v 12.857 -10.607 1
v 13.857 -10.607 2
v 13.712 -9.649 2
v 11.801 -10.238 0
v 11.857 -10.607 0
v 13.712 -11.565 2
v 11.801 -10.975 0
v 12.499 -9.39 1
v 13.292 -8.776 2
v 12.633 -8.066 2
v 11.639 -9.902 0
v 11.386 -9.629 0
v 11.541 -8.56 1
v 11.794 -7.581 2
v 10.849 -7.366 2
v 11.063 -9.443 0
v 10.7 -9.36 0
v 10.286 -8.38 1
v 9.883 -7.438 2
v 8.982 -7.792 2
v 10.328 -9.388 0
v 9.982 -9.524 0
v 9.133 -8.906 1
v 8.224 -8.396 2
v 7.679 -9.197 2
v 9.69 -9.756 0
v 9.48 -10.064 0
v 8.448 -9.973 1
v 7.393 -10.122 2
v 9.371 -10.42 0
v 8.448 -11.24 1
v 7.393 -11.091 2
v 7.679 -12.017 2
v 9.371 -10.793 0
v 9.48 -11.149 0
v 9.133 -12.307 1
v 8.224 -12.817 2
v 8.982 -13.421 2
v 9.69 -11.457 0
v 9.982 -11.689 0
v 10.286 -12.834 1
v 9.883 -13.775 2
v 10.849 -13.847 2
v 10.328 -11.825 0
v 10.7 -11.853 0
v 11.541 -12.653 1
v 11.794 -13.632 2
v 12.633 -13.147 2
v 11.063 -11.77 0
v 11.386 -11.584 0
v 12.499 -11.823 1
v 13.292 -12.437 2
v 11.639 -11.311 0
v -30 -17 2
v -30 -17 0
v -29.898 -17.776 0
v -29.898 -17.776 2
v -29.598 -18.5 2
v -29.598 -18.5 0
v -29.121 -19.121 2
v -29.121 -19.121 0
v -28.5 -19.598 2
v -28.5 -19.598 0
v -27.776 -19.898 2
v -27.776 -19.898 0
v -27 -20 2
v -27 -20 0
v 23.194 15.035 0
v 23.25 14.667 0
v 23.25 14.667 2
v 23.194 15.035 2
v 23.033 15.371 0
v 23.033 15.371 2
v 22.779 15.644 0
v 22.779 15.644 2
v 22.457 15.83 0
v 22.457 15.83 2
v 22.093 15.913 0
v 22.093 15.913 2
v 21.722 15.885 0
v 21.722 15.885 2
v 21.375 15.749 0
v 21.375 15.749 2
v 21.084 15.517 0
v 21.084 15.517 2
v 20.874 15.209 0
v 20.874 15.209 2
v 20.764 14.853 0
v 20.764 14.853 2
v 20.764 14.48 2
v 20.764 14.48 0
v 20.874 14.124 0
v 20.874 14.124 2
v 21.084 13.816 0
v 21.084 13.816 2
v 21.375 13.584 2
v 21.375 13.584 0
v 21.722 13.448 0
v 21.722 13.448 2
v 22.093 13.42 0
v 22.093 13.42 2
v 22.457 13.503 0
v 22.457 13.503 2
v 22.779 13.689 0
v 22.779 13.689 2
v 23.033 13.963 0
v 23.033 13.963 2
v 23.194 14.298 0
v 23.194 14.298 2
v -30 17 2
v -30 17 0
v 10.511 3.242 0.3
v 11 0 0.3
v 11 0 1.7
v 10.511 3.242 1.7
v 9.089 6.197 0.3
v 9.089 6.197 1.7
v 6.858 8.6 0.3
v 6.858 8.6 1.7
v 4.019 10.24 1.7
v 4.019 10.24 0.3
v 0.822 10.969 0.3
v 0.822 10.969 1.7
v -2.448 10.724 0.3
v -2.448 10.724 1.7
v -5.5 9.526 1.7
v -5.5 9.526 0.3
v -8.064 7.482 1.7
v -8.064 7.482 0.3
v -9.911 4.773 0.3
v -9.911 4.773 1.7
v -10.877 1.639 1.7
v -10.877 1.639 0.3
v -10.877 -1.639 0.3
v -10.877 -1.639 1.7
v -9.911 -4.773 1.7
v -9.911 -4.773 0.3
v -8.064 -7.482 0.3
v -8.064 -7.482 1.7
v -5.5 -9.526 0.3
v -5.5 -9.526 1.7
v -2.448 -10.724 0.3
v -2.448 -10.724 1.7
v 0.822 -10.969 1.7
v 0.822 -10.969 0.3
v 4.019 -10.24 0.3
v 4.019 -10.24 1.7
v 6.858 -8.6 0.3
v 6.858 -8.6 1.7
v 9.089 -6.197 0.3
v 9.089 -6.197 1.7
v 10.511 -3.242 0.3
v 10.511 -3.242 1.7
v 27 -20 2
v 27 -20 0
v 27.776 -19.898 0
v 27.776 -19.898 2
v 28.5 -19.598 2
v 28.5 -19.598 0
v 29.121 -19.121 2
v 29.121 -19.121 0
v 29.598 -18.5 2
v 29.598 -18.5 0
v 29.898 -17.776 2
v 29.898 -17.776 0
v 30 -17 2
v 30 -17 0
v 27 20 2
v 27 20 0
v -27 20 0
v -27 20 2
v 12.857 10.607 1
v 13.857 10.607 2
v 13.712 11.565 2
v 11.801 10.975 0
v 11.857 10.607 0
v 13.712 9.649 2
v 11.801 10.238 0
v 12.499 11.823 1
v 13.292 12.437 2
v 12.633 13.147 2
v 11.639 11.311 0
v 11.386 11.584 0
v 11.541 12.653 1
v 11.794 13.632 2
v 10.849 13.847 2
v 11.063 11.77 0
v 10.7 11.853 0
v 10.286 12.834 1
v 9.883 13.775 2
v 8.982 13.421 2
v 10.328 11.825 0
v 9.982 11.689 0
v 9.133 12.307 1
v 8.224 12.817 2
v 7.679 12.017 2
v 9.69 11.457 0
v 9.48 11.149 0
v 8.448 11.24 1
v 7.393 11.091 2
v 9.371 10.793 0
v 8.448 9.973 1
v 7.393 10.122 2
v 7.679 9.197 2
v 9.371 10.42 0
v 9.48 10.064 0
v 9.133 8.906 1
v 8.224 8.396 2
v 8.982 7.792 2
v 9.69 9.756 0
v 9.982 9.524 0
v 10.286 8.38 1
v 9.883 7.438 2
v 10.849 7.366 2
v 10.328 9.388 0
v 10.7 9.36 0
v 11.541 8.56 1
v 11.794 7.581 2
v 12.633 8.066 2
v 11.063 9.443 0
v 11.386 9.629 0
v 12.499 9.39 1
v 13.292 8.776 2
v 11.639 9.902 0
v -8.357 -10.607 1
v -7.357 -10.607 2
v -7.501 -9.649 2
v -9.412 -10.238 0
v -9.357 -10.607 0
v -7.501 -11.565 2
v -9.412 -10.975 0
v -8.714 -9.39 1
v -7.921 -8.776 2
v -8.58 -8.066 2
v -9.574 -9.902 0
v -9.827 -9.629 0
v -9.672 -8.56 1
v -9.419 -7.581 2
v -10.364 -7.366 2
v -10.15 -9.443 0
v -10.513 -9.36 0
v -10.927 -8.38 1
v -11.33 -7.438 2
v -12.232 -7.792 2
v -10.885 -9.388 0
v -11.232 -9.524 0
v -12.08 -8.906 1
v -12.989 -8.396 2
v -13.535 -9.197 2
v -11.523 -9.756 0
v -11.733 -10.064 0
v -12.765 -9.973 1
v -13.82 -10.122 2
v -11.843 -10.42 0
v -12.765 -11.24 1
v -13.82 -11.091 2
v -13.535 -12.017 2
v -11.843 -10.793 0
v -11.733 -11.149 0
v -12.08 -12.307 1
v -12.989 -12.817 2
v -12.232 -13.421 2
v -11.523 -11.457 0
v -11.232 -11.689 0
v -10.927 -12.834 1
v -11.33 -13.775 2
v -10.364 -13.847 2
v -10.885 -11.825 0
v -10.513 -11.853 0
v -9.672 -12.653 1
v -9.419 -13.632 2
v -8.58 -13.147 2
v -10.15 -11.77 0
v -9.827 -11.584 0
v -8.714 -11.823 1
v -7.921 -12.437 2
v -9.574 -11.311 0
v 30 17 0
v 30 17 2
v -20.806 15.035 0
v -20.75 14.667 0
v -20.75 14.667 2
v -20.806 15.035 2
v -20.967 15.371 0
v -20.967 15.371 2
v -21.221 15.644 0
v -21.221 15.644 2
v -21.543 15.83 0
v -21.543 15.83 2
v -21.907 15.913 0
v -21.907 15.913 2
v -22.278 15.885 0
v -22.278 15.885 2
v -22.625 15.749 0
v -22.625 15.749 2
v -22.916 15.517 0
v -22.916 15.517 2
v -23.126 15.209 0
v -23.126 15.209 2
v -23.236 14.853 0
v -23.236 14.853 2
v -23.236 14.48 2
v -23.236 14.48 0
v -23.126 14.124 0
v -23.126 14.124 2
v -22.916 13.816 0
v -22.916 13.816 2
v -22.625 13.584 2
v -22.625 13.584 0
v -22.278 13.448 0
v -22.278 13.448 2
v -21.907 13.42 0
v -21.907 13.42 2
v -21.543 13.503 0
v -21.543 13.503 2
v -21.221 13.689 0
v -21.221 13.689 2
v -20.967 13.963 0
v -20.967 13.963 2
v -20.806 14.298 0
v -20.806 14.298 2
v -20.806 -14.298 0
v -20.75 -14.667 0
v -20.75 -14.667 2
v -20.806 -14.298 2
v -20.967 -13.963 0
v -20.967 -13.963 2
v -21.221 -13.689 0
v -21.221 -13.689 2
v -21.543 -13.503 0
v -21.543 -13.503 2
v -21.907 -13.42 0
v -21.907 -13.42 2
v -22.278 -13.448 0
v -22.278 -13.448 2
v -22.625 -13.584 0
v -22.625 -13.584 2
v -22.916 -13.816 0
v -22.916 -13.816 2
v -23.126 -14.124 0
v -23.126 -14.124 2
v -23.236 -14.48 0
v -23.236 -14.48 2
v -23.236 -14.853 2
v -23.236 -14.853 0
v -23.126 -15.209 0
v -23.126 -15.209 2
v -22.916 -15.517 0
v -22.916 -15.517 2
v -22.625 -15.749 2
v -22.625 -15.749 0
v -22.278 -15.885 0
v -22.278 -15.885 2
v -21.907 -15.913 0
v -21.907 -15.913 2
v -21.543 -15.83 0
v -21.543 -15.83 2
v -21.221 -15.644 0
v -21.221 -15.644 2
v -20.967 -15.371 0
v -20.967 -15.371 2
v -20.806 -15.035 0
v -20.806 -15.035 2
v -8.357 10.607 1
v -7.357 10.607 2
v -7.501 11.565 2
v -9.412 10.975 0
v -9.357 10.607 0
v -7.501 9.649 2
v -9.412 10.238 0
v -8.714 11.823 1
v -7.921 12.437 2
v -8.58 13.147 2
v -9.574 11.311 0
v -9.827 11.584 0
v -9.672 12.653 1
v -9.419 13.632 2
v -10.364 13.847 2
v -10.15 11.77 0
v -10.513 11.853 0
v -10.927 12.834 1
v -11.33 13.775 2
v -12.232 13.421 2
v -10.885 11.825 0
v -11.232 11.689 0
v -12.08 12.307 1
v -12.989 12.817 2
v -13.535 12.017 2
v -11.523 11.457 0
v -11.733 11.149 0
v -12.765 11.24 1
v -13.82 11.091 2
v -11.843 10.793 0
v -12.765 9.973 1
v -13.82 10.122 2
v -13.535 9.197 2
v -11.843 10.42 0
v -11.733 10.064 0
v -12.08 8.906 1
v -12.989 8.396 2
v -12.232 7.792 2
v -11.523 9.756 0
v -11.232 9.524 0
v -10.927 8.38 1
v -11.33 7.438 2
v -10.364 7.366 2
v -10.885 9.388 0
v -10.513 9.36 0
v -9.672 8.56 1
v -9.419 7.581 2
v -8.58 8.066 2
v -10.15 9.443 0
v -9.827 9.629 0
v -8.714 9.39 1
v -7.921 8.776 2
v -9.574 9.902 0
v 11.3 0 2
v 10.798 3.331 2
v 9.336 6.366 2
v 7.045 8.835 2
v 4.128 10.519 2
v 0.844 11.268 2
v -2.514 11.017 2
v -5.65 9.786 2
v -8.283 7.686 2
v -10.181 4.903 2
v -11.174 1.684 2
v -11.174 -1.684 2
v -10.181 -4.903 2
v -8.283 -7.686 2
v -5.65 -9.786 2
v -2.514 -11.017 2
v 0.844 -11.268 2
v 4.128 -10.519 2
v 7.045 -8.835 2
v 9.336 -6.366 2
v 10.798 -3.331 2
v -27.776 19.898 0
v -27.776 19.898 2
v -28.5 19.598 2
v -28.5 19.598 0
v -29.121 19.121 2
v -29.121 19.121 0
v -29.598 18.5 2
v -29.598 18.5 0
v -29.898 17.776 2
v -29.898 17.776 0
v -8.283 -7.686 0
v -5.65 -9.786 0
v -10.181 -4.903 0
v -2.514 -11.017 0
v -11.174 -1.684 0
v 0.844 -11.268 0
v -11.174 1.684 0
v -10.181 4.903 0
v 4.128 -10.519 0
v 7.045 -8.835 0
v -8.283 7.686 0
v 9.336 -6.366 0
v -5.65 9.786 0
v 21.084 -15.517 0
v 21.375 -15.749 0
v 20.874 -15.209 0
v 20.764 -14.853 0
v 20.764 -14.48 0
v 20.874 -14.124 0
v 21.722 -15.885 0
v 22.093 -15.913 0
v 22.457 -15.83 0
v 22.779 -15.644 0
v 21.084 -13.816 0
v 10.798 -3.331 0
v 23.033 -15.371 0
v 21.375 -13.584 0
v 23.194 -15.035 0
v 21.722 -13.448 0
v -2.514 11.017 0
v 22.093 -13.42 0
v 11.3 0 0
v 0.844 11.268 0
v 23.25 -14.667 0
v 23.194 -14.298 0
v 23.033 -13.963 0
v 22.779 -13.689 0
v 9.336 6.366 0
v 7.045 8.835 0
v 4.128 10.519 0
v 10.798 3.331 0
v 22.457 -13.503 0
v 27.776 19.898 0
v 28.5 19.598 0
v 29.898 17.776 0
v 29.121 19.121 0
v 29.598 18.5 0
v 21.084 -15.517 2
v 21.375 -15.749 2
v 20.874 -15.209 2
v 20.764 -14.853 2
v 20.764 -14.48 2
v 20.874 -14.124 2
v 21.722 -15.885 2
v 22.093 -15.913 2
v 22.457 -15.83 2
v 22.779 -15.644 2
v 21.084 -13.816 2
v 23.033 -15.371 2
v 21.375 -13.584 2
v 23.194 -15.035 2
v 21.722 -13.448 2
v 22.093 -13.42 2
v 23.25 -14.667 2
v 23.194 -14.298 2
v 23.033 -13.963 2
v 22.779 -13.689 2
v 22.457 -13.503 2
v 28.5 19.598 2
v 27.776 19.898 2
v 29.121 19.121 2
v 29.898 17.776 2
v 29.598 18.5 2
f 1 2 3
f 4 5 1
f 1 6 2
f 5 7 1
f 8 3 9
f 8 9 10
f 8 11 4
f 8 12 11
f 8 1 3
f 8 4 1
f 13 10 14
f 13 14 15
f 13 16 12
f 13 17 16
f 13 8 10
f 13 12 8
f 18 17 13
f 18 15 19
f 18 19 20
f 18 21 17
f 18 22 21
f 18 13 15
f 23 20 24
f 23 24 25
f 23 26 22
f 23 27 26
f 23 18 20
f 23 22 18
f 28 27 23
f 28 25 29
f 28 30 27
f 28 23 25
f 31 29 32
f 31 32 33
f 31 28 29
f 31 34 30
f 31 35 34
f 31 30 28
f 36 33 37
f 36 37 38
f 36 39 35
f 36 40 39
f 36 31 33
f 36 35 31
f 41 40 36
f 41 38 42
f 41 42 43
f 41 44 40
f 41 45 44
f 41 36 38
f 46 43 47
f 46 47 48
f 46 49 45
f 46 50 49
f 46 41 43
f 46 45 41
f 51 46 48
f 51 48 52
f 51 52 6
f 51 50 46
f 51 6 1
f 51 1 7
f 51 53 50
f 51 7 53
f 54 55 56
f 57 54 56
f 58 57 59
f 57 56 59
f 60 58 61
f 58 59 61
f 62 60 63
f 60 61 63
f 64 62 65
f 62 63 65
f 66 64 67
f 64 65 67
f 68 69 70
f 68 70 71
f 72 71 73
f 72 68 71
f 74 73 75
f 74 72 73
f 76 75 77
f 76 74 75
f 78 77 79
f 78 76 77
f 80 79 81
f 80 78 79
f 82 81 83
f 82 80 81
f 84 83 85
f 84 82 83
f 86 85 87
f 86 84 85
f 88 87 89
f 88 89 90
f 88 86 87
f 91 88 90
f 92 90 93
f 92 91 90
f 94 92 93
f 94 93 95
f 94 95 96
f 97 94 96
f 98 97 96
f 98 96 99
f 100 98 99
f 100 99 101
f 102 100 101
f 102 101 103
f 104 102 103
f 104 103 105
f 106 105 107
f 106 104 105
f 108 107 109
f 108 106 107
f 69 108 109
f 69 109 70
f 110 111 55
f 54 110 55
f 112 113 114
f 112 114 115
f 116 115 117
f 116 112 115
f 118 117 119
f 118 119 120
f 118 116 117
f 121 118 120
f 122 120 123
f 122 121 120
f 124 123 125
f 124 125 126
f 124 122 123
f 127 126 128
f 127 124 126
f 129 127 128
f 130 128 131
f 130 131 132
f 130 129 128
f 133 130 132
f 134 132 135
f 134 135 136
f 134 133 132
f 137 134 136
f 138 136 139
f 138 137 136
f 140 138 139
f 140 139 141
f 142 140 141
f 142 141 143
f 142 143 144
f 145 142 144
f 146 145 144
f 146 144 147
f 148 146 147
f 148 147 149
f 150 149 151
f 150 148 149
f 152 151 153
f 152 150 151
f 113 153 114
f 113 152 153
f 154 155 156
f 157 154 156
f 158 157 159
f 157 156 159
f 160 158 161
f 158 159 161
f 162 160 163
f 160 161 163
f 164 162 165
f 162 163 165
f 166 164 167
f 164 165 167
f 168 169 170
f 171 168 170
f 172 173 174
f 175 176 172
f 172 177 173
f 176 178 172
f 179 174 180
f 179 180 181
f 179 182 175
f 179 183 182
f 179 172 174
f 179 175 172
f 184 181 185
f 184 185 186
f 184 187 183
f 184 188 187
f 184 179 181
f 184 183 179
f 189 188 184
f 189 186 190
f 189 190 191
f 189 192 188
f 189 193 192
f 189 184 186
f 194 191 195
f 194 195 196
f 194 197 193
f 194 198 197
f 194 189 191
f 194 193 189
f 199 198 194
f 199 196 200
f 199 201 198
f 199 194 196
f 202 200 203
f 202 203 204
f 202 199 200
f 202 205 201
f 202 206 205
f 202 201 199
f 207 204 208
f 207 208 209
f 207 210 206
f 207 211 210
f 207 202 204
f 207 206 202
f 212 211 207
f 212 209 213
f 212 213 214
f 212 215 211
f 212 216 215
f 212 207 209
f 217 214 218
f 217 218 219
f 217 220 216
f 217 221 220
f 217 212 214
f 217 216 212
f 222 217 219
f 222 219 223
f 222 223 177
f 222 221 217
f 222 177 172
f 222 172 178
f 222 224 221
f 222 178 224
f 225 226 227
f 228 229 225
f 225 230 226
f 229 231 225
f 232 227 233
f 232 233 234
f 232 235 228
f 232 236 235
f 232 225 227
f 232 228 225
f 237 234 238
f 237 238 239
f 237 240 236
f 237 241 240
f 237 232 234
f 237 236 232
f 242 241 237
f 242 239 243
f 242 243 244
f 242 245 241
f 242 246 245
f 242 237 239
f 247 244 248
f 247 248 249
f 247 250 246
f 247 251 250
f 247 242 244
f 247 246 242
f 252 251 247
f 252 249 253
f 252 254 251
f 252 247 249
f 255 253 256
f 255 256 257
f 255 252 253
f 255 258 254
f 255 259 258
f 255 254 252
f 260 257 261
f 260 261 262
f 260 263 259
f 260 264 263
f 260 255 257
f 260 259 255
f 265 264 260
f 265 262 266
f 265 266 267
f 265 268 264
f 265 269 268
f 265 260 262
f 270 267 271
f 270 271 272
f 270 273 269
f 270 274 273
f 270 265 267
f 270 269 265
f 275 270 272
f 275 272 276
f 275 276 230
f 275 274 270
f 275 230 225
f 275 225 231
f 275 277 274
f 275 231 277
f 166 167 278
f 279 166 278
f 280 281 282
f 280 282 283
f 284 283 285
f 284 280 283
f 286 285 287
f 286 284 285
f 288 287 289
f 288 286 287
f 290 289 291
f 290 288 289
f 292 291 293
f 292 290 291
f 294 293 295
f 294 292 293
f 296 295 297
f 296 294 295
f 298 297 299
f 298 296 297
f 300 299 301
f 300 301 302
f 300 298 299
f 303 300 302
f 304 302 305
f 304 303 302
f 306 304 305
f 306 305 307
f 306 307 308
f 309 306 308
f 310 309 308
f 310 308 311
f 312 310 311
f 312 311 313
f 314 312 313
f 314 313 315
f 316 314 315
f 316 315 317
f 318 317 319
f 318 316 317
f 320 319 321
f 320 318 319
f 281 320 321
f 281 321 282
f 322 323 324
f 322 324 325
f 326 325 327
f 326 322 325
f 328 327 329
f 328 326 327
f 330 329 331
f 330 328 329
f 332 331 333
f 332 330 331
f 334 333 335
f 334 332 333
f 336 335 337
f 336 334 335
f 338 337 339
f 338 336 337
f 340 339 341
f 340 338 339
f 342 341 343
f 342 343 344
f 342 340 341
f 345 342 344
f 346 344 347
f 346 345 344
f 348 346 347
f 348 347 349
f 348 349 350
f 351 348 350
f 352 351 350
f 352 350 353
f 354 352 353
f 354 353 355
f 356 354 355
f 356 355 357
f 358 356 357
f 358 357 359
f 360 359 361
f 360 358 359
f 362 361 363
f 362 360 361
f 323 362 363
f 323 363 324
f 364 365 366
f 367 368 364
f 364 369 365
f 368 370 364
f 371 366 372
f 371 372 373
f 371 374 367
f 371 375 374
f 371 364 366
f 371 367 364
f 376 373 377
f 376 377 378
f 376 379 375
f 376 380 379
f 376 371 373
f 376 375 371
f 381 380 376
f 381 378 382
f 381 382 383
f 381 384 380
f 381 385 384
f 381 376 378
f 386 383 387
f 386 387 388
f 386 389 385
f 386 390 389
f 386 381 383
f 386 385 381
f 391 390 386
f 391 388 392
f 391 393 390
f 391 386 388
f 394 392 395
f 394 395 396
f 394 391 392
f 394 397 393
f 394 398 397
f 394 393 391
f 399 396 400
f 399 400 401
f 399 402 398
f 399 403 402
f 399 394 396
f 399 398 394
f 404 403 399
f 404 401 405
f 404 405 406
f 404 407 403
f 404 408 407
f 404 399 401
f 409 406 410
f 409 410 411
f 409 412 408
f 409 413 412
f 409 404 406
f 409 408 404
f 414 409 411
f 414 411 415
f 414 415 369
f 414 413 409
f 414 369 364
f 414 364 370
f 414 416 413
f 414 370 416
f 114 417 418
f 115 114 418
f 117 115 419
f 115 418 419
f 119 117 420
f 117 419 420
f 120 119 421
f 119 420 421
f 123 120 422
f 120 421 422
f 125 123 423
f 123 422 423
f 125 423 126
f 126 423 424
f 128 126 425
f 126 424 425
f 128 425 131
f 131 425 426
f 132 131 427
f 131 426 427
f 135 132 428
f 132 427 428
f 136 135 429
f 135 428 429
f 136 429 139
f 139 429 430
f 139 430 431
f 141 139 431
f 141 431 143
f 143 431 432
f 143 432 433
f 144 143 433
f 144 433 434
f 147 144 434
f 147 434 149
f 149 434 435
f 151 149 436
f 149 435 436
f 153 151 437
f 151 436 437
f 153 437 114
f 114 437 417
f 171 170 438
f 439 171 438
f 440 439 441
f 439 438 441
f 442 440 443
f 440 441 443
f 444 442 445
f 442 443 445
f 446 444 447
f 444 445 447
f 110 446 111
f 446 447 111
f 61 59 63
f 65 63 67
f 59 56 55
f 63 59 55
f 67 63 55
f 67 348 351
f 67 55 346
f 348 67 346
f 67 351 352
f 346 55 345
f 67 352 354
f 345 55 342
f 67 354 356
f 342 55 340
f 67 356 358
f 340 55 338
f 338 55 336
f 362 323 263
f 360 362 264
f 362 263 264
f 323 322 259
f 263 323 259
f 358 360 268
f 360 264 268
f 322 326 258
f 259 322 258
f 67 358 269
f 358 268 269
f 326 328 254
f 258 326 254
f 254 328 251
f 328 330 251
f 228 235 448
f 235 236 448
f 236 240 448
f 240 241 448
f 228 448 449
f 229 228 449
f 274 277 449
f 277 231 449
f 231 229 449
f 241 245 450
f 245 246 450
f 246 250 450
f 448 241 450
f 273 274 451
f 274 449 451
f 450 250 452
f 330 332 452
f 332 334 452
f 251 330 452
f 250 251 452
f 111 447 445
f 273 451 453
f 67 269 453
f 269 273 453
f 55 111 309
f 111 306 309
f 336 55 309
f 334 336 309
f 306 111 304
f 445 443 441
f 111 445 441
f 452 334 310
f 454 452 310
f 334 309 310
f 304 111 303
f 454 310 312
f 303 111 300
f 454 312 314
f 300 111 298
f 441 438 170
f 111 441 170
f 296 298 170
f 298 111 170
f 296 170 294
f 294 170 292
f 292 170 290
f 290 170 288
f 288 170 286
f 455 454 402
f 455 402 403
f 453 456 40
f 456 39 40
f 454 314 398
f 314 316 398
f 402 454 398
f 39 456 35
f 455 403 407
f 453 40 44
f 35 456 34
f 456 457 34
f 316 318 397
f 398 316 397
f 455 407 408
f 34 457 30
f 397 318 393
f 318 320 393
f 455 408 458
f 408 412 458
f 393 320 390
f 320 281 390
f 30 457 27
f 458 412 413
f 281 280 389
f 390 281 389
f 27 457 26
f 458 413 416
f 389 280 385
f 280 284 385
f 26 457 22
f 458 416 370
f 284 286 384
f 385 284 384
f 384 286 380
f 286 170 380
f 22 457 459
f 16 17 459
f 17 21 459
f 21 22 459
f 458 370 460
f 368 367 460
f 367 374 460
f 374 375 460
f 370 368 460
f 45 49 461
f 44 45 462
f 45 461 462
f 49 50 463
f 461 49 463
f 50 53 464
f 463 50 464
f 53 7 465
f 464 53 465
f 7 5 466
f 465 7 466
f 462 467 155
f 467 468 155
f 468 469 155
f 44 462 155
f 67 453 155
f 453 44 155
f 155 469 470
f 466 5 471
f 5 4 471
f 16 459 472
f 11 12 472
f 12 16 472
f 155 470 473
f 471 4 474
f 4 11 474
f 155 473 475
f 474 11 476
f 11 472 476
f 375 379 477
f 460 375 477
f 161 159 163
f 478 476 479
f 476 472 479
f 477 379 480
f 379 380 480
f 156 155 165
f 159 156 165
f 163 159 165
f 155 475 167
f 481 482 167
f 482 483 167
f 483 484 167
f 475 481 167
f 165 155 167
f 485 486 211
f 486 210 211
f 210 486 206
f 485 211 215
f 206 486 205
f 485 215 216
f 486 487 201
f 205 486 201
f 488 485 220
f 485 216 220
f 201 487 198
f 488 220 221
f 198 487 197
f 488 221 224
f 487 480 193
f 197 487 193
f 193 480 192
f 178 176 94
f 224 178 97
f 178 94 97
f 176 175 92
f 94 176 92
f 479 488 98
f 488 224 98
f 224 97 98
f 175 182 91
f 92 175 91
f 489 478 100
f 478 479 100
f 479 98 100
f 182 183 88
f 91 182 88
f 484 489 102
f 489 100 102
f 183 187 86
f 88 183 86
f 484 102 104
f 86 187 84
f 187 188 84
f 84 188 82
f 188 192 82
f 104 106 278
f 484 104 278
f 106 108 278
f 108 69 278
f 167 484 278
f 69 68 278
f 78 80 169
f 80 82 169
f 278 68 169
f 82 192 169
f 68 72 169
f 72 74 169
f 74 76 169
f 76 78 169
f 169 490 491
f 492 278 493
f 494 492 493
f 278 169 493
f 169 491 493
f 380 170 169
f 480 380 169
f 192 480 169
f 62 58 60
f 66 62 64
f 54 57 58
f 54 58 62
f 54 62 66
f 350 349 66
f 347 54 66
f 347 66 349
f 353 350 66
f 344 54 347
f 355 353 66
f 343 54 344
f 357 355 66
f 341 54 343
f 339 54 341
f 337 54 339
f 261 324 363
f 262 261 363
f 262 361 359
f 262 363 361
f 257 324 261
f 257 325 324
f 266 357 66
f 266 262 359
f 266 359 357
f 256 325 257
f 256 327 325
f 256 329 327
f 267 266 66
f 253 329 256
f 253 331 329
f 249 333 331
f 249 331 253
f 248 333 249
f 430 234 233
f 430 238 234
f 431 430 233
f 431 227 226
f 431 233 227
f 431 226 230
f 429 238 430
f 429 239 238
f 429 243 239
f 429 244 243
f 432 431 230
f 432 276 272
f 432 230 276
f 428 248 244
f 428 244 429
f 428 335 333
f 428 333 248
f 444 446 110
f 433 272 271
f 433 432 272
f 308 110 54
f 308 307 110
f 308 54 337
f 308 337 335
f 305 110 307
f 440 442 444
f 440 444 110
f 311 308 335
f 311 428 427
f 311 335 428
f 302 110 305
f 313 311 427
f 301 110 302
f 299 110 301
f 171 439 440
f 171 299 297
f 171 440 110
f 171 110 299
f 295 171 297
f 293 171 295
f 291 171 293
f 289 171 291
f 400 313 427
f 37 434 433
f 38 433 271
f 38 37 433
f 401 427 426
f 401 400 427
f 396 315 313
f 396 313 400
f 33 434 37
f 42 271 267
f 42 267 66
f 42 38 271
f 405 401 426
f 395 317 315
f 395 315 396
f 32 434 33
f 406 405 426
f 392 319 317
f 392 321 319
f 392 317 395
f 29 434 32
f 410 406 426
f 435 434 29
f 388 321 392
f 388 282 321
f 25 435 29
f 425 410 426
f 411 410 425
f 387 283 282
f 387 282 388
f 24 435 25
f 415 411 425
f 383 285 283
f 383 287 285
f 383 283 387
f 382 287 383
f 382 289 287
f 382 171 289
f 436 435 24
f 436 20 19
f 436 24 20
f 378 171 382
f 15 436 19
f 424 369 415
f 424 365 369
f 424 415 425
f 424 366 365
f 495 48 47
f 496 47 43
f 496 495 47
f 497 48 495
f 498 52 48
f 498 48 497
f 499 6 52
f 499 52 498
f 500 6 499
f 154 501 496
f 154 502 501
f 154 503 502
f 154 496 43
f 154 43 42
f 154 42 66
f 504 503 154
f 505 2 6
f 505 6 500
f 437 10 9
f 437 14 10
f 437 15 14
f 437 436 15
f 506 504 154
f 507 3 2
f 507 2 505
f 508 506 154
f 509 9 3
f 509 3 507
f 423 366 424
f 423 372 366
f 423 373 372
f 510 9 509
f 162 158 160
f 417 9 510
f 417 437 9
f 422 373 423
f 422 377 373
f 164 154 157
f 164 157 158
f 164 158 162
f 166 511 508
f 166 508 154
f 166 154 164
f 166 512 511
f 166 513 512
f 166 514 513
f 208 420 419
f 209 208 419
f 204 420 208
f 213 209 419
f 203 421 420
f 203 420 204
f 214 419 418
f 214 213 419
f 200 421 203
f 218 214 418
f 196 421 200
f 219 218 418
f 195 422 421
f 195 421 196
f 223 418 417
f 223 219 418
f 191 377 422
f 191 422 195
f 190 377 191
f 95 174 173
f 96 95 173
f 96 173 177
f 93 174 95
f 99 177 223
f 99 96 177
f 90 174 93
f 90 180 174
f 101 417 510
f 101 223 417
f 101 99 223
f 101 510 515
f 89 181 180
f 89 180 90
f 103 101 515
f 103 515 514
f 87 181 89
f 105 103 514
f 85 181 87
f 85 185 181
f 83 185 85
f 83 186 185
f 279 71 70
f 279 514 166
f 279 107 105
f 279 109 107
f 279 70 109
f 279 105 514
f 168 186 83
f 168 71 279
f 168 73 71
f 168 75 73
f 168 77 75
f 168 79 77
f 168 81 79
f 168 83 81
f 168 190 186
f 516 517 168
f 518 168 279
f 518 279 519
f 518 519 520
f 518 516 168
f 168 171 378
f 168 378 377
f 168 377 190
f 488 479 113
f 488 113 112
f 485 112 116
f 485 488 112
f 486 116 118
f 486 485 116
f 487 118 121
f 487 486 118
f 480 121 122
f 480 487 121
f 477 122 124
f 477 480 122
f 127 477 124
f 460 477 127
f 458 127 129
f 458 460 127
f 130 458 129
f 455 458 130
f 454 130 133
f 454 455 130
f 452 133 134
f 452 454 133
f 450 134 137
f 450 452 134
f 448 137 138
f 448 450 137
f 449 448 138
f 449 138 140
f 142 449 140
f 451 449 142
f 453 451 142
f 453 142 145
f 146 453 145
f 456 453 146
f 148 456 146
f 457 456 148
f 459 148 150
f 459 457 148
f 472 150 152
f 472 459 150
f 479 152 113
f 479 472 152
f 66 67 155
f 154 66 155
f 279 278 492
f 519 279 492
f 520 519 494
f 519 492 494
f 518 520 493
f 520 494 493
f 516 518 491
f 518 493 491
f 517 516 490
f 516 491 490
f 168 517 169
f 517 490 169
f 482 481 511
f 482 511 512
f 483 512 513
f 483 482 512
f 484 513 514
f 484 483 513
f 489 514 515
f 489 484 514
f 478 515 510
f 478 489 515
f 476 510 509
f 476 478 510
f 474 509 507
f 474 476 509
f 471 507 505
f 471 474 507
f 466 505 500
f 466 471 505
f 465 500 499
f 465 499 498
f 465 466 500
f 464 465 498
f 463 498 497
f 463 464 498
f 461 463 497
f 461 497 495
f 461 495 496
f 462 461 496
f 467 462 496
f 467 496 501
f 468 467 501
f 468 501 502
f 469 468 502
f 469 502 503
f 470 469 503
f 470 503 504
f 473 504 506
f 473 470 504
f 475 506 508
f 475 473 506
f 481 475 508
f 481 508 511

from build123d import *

# Parameters (mm, degrees)
SZKIC1_R                    = 11
SZKIC1_R_2                  = 1.25
DODANIE_WYCI_GNI_CIE1_DEPTH = 2
SFAZOWANIE1_SIZE            = 0.3
SFAZOWANIE2_SIZE            = 2


with BuildPart() as part:
    # Szkic1 → Dodanie-wyciągnięcie1 (new body)
    with BuildSketch(Plane.XY):
        with BuildLine():
            Line((-27, -20), (27, -20))
            ThreePointArc((27, -20), (29.121320344, -19.121320344), (30, -17))
            Line((30, -17), (30, 17))
            ThreePointArc((30, 17), (29.121320344, 19.121320344), (27, 20))
            Line((27, 20), (-27, 20))
            ThreePointArc((-27, 20), (-29.121320344, 19.121320344), (-30, 17))
            Line((-30, 17), (-30, -17))
            ThreePointArc((-30, -17), (-29.121320344, -19.121320344), (-27, -20))
        make_face()
        Circle(SZKIC1_R, mode=Mode.SUBTRACT)
        with Locations((-22, 14.666666667)):
            Circle(SZKIC1_R_2, mode=Mode.SUBTRACT)
        with Locations((22, 14.666666667)):
            Circle(SZKIC1_R_2, mode=Mode.SUBTRACT)
        with Locations((22, -14.666666667)):
            Circle(SZKIC1_R_2, mode=Mode.SUBTRACT)
        with Locations((-10.606601718, -10.606601718)):
            Circle(SZKIC1_R_2, mode=Mode.SUBTRACT)
        with Locations((10.606601718, -10.606601718)):
            Circle(SZKIC1_R_2, mode=Mode.SUBTRACT)
        with Locations((10.606601718, 10.606601718)):
            Circle(SZKIC1_R_2, mode=Mode.SUBTRACT)
        with Locations((-10.606601718, 10.606601718)):
            Circle(SZKIC1_R_2, mode=Mode.SUBTRACT)
        with Locations((-22, -14.666666667)):
            Circle(SZKIC1_R_2, mode=Mode.SUBTRACT)
    extrude(amount=DODANIE_WYCI_GNI_CIE1_DEPTH)

    # Sfazowanie1
    sfazowanie1_edges = [part.edges().sort_by_distance(p)[0] for p in [
        (-11, 0, 0),
        (-11, 0, 2),
    ]]
    chamfer(sfazowanie1_edges, length=SFAZOWANIE1_SIZE)

    # Sfazowanie2
    sfazowanie2_edges = [part.edges().sort_by_distance(p)[0] for p in [
        (-11.856601718, -10.606601718, 2),
        (9.356601718, -10.606601718, 2),
        (9.356601718, 10.606601718, 2),
        (-11.856601718, 10.606601718, 2),
    ]]
    chamfer(sfazowanie2_edges, length=SFAZOWANIE2_SIZE - 0.0001)  # a hair under: the kernel refuses the full size


solid = part.part
